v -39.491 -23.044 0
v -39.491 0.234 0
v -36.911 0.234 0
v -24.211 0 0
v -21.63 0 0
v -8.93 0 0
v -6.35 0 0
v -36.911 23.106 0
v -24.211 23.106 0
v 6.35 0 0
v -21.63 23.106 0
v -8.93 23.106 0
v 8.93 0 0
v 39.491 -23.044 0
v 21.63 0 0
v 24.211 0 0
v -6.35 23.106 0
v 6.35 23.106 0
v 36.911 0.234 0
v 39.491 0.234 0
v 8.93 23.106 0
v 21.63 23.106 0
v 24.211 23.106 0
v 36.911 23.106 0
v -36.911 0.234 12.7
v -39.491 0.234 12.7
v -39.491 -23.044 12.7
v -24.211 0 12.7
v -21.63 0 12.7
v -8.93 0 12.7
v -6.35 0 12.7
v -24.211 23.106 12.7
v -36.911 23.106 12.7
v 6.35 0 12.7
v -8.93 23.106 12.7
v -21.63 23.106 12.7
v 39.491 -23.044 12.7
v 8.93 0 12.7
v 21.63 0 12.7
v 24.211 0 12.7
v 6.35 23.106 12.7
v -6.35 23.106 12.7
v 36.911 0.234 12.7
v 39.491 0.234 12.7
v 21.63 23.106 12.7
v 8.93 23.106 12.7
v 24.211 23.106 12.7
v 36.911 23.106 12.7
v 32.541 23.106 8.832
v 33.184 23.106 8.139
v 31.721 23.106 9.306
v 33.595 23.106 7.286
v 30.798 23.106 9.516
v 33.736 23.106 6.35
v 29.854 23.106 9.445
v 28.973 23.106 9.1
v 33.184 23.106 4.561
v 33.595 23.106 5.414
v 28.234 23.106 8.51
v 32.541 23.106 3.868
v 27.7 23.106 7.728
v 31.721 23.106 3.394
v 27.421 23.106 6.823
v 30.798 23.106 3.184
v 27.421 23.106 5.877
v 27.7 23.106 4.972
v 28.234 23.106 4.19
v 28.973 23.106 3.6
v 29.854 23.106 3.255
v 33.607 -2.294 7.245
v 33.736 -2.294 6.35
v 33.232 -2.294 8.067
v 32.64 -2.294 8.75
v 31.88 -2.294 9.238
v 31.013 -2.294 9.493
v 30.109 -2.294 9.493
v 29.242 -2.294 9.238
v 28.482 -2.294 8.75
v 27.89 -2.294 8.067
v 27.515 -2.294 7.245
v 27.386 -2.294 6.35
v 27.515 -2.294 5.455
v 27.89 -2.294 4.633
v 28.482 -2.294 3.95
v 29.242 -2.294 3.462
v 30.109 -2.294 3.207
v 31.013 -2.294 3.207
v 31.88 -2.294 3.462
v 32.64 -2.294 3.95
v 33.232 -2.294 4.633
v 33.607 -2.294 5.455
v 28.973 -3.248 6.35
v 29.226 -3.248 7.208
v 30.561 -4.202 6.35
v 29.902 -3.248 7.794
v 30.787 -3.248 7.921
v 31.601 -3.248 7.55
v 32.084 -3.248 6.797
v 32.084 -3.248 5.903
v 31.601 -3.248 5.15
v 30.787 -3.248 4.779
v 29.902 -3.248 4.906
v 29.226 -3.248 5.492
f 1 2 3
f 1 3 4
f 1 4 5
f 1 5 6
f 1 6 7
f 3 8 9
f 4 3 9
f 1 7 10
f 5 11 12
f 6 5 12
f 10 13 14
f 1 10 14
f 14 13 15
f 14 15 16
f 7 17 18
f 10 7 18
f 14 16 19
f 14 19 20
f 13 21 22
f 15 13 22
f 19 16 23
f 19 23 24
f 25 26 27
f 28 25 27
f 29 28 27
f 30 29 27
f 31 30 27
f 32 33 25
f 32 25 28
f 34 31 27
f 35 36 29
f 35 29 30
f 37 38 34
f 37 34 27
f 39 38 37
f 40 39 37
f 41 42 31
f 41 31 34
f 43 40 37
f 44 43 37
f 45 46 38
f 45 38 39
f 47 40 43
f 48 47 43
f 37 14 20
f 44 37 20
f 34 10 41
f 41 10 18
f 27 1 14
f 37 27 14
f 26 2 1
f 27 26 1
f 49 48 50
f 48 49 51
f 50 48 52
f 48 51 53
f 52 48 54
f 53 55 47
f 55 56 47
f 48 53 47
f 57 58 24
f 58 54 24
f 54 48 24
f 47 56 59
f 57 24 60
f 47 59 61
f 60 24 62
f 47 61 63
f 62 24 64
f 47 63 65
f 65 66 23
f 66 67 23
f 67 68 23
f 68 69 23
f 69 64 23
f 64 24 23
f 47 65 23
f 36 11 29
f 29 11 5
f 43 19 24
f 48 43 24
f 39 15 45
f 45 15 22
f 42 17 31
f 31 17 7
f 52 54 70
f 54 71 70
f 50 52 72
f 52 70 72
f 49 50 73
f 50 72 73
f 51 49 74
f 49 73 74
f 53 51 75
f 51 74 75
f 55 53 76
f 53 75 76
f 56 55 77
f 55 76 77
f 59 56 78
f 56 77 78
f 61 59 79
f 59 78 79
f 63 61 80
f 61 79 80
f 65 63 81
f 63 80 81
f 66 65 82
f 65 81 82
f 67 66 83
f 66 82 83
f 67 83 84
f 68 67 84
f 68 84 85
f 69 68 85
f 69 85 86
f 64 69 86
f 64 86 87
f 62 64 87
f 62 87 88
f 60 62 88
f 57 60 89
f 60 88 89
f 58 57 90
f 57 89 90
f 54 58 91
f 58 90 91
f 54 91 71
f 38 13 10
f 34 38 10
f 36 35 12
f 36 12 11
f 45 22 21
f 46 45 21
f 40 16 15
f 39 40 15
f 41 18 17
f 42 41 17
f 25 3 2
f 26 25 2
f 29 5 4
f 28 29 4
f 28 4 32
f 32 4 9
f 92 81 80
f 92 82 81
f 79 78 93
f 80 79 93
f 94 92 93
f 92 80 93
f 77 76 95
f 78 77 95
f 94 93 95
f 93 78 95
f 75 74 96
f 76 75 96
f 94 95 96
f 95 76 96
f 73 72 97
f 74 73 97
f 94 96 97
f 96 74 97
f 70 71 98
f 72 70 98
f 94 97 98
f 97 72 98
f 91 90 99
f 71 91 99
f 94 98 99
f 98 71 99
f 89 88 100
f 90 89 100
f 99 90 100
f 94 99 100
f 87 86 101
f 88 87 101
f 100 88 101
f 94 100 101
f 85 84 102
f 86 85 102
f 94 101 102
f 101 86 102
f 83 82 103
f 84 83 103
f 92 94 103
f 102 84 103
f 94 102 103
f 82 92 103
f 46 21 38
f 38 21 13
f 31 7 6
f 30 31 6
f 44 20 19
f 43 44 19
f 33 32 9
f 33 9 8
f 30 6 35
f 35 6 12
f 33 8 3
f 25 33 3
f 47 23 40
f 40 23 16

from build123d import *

# Parameters (mm, degrees)
F1_DEPTH = 12.7
F3_D     = 6.35
F3_DEPTH = 25.4
F3_TIP   = 1.9077324654


with BuildPart() as f1:
    # F0 (on Top) → F1 (new body)
    with BuildSketch(Plane.XY):
        Polygon((39.4914927714, -23.0438545598), (39.4914927714, 0.2341428303), (36.910995181, 0.2341428303), (36.910995181, 23.1056753299), (24.210995181, 23.1056753299), (24.210995181, 0), (21.6304975905, 0), (21.6304975905, 23.1056753299), (8.9304975905, 23.1056753299), (8.9304975905, 0), (6.35, 0), (6.35, 23.1056753299), (0, 23.1056753299), (-6.35, 23.1056753299), (-6.35, 0), (-8.9304975905, 0), (-8.9304975905, 23.1056753299), (-21.6304975905, 23.1056753299), (-21.6304975905, 0), (-24.210995181, 0), (-24.210995181, 23.1056753299), (-36.910995181, 23.1056753299), (-36.910995181, 0.2341428303), (-39.4914927714, 0.2341428303), (-39.4914927714, -23.0438545598), (0, -23.0438545598), align=None)
    extrude(amount=F1_DEPTH)

    # F3
    with Locations(Plane(origin=(0, 23.1056753299, 0), x_dir=(-1, 0, 0), z_dir=(0, 1, 0))):
        with Locations((-30.560995181, 6.35)):
            Hole(F3_D / 2, depth=F3_DEPTH)
            with Locations((0, 0, -(F3_DEPTH + F3_TIP / 2))):  # 118° drill point
                Cone(0, F3_D / 2, F3_TIP, mode=Mode.SUBTRACT)


solid = f1.part
